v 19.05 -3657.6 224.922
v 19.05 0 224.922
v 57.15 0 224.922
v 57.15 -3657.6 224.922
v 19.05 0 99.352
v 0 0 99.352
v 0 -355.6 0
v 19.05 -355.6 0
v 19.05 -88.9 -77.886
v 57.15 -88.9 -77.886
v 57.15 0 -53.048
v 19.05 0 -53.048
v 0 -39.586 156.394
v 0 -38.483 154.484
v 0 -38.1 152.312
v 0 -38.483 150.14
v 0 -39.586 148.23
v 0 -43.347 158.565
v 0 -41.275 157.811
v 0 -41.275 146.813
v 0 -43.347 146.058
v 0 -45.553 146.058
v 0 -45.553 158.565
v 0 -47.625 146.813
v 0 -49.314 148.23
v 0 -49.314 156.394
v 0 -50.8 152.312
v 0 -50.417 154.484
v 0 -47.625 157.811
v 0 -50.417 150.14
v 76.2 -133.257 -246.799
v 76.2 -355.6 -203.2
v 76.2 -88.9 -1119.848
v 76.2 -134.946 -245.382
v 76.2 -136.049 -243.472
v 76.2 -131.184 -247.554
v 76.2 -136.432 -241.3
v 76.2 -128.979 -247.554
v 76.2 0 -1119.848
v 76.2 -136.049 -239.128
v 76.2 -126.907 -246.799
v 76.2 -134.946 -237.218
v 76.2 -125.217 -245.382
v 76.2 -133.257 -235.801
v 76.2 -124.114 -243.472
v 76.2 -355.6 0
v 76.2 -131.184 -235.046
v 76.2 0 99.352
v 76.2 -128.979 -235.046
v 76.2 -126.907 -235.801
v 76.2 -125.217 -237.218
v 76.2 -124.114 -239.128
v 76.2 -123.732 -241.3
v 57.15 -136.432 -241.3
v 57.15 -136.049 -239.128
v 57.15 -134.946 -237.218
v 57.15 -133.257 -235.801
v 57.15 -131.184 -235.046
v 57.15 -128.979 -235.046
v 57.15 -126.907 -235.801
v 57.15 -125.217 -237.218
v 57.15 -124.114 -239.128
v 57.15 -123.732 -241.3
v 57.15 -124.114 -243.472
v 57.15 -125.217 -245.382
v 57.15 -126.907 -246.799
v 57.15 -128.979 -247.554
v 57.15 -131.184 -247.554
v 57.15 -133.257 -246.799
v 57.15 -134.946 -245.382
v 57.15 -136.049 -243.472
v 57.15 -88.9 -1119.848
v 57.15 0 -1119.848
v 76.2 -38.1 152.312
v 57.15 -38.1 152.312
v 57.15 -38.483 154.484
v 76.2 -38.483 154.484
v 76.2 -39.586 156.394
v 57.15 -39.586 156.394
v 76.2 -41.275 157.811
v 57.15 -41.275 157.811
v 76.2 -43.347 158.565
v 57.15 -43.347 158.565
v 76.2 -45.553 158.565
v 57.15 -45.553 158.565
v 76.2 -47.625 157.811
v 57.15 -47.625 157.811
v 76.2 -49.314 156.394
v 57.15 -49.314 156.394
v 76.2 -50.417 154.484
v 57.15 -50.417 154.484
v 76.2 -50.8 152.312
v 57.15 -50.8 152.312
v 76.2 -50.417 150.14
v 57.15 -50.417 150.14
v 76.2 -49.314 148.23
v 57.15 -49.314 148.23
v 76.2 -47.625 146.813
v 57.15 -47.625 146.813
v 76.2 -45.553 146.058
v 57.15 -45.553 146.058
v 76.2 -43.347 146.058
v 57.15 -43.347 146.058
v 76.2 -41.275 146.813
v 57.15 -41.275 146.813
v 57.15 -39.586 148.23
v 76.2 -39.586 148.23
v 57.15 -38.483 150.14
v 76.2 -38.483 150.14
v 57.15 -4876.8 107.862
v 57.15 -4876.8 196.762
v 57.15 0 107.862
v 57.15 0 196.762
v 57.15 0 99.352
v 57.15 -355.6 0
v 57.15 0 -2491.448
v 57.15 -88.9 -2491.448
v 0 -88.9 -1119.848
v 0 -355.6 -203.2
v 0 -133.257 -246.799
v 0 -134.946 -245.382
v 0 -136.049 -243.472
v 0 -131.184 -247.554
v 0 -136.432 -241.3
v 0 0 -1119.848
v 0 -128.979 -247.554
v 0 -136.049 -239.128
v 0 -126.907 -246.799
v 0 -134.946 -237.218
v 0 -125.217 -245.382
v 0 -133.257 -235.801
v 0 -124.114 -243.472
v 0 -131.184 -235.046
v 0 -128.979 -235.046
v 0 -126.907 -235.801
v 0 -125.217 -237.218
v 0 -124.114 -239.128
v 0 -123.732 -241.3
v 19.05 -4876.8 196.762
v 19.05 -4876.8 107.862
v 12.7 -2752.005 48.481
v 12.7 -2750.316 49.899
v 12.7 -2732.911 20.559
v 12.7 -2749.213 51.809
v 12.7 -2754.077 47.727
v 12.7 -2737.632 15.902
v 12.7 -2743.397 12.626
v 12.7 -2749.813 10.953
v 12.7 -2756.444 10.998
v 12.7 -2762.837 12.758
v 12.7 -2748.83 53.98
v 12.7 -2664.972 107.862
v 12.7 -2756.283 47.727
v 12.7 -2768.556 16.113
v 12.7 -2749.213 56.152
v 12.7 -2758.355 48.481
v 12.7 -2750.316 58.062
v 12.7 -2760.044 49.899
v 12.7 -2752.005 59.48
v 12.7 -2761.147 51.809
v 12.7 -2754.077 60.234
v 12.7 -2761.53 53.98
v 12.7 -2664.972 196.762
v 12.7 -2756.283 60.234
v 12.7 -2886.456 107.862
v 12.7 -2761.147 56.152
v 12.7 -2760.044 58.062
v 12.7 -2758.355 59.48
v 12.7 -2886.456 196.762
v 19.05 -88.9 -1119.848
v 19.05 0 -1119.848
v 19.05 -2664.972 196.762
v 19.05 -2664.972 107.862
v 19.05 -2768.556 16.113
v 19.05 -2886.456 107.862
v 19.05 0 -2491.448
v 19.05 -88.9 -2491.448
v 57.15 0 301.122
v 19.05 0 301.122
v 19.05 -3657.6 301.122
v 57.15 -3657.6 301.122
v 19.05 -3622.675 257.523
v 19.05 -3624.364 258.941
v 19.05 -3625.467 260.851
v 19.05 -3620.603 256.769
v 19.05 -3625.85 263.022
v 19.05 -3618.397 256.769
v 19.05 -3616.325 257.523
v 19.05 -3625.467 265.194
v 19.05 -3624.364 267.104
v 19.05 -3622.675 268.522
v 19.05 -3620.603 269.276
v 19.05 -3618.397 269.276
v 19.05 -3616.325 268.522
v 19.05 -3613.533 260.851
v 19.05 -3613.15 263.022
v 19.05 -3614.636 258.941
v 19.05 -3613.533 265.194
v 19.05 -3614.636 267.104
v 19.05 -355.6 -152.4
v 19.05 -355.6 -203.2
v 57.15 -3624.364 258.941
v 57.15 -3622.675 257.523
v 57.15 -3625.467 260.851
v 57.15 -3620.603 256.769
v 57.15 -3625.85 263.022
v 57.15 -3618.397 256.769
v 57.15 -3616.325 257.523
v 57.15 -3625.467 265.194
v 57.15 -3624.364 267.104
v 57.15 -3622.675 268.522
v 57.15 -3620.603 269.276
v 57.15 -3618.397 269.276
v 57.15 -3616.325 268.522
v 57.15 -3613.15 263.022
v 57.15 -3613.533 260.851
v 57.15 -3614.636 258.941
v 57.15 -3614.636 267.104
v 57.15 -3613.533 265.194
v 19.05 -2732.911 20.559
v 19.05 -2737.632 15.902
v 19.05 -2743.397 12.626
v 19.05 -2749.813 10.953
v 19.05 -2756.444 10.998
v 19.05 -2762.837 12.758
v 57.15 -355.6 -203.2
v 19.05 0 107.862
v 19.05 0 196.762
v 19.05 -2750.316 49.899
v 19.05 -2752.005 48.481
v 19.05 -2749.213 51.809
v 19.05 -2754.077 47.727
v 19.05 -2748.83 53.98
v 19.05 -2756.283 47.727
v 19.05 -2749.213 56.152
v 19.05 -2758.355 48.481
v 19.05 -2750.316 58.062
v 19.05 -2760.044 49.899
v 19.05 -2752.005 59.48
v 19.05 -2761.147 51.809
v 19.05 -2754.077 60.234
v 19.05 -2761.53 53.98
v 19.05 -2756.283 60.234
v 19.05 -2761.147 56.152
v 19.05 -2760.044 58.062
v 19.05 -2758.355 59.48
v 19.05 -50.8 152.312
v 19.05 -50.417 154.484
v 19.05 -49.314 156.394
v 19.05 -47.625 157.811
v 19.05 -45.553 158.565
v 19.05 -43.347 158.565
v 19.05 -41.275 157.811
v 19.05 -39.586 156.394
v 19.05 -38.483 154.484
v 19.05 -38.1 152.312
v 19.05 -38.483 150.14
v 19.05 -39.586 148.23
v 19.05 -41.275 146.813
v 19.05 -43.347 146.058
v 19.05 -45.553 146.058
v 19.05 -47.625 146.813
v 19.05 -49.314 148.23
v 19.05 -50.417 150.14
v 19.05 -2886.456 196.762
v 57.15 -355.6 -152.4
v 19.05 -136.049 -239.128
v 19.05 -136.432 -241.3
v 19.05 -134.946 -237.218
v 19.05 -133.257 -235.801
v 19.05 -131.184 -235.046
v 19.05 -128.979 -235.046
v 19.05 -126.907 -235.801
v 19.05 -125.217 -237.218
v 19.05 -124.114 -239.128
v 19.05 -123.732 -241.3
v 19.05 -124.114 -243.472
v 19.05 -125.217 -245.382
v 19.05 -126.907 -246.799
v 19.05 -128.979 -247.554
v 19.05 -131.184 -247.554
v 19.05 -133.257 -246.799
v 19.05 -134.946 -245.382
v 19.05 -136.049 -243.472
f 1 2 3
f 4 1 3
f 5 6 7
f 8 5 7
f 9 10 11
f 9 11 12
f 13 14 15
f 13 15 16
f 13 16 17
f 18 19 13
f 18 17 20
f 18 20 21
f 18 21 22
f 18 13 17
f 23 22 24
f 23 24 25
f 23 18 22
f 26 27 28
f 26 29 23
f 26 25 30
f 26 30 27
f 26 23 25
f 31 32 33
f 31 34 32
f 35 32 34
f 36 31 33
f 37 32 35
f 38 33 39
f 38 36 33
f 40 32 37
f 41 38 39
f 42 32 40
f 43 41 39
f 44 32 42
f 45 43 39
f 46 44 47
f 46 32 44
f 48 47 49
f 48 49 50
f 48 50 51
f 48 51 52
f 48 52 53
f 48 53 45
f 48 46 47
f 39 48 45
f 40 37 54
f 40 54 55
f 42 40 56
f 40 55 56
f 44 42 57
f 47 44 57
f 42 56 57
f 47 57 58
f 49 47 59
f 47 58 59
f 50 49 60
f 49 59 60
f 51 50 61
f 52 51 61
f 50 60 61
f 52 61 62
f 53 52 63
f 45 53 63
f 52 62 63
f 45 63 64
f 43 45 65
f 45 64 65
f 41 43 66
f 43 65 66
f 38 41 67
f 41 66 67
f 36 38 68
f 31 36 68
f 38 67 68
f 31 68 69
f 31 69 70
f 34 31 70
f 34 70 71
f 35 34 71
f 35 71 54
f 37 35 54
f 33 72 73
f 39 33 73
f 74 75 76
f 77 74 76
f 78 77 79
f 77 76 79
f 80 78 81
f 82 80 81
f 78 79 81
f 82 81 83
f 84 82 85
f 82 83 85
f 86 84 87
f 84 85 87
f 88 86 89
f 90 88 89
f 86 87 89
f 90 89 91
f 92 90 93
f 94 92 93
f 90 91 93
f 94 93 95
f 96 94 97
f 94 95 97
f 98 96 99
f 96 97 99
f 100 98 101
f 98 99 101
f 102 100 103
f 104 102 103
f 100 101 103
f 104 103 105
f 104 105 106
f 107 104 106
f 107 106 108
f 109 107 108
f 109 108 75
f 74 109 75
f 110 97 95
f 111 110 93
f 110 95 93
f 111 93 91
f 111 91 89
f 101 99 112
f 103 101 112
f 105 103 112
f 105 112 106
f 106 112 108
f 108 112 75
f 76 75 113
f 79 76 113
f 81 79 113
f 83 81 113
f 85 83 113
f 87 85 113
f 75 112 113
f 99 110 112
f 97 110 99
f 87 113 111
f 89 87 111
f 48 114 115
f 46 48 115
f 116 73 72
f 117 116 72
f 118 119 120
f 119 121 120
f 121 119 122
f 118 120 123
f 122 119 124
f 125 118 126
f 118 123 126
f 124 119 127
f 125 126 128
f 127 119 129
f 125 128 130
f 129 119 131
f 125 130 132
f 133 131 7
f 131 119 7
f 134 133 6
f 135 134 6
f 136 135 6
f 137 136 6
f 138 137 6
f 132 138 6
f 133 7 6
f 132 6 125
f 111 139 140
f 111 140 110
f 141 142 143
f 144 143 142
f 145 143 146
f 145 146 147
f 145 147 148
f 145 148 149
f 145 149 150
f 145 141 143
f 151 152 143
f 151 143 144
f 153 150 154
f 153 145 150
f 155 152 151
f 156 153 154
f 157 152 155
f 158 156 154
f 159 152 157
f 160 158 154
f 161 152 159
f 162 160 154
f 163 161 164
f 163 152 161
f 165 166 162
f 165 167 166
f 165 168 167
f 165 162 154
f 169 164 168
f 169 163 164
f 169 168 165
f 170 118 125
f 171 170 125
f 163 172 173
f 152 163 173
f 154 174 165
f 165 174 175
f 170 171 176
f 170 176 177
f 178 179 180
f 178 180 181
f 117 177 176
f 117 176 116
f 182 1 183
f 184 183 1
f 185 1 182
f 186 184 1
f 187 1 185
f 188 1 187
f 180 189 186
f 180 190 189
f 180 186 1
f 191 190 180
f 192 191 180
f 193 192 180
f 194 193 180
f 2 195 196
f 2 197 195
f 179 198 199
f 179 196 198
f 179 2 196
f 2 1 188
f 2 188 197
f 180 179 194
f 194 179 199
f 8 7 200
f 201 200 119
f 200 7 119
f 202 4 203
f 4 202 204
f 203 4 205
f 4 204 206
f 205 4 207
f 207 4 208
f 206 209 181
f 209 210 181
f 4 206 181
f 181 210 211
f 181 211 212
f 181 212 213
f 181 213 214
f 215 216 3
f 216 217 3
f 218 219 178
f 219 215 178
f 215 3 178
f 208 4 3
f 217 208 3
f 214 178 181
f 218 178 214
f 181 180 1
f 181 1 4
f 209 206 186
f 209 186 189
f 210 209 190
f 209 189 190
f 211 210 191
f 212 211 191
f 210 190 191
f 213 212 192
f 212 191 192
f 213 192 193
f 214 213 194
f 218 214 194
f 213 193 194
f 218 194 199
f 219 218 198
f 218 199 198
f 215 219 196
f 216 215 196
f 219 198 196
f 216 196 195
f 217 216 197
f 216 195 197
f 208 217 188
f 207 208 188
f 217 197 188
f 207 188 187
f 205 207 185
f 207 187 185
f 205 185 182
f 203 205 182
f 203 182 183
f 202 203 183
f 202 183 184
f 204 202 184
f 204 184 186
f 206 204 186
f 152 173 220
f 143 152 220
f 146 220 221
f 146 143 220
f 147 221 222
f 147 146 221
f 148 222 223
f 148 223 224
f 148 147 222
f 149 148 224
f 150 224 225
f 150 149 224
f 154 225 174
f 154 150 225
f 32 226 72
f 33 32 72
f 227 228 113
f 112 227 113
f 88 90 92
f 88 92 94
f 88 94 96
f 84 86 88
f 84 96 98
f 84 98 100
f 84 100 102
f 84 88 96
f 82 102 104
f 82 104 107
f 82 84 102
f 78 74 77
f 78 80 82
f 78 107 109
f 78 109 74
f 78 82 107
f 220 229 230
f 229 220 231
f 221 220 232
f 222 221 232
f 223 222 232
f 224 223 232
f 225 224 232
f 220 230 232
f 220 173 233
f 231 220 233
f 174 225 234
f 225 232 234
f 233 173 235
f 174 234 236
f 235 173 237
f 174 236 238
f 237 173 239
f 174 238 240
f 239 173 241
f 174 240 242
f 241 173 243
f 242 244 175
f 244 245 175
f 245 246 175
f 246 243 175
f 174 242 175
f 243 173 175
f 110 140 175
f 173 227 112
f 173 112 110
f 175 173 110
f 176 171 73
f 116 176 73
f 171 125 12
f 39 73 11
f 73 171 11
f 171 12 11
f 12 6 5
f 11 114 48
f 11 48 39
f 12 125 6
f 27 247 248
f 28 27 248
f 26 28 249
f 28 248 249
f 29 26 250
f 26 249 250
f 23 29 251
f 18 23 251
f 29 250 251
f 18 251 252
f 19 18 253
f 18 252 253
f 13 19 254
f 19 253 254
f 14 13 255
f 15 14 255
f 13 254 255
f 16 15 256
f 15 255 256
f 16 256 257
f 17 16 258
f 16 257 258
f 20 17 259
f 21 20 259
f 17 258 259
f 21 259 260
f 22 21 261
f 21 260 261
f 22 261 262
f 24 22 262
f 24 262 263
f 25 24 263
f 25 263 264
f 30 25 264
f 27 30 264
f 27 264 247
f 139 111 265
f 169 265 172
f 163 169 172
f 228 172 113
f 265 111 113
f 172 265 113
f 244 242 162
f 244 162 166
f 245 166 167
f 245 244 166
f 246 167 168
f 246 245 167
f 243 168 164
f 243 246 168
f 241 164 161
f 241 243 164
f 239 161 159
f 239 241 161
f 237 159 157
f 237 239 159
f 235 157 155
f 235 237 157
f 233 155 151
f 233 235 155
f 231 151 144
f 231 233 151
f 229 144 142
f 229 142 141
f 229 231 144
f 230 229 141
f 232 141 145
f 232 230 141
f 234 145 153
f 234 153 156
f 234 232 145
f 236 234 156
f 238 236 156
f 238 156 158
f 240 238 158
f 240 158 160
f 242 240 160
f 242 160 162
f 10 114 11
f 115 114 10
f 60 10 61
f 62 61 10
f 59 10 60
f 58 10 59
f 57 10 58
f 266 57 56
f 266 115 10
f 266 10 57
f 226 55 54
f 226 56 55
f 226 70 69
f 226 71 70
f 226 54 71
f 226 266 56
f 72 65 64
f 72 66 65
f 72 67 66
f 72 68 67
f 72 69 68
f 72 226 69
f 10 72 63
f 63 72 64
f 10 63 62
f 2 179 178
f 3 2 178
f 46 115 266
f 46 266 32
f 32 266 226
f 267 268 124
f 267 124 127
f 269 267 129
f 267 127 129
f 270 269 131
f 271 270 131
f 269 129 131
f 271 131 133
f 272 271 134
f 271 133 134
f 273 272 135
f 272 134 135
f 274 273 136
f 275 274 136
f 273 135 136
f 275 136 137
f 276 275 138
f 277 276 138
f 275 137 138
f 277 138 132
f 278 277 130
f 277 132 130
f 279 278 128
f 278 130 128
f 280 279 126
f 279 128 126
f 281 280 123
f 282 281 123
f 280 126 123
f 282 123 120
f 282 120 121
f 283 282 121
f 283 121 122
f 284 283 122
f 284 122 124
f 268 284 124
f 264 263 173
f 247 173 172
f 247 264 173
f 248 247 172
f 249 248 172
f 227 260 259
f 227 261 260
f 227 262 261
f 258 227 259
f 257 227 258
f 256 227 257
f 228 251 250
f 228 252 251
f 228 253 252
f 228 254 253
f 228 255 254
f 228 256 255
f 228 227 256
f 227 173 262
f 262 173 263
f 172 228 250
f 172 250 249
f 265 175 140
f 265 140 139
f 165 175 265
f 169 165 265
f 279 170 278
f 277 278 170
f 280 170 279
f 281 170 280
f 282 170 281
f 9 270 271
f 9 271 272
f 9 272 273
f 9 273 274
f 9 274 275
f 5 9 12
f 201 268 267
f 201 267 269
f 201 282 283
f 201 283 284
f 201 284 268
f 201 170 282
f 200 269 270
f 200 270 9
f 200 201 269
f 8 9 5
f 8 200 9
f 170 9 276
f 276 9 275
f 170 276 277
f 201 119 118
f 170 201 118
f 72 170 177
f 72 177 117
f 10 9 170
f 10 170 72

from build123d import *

# Parameters (mm, degrees)
F1_DEPTH  = 76.2
F2_W      = 38.1
F2_H      = 152.4
F4_W      = 38.1
F4_H      = 266.7
F5_DEPTH  = 1219.201
F6_W      = 38.1
F6_H      = 88.9
F7_DEPTH  = 1371.6
F8_R      = 6.35
F9_DEPTH  = 76.201
F10_W     = 38.1
F10_H     = 88.9
F11_DEPTH = 4876.8
F12_R     = 6.35
F13_DEPTH = 19.05
F14_R     = 6.35
F15_DEPTH = 19.05
F16_R     = 6.35
F17_DEPTH = 6.35
F18_R     = 25.4
F19_W     = 38.1
F19_H     = 76.2
F20_DEPTH = 3657.6
F21_R     = 6.35
F22_DEPTH = 57.151


with BuildPart() as f1:
    # F0 (on Right) → F1 (new body)
    with BuildSketch(Plane.YZ):
        Polygon((0, 99.3522093521), (-355.6, 0), (-355.6, -203.2), (-88.9, -1119.8477906479), (0, -1119.8477906479), align=None)
    extrude(amount=F1_DEPTH)

    # F3: sweep along a path in F3_path
    with BuildLine(Plane(origin=(76.2, 0, 99.3522093521), x_dir=(0, 0.9631156168, 0.2690879201), z_dir=(0, -0.2690879201, 0.9631156168))) as f3_path:
        Line((0, 0), (-369.2183926935, 0))
    # F2 (on face) → F3 (sweep, cut)
    with BuildSketch(Plane(origin=(0, 0, 0), x_dir=(-1, 0, 0), z_dir=(0, 1, 0))):
        with Locations((-38.1, 23.1522093521)):
            Rectangle(F2_W, F2_H)
    sweep(path=f3_path.line, mode=Mode.SUBTRACT)

    # F4 (on face) → F5 (cut, through all)
    with BuildSketch(Plane(origin=(0, 0, -1119.8477906479), x_dir=(1, 0, 0), z_dir=(0, 0, -1))):
        with Locations((38.1, 222.25)):
            Rectangle(F4_W, F4_H)
    extrude(amount=-F5_DEPTH, mode=Mode.SUBTRACT)

    # F6 (on face) → F7 (join)
    with BuildSketch(Plane(origin=(0, 0, -1119.8477906479), x_dir=(1, 0, 0), z_dir=(0, 0, -1))):
        with Locations((38.1, 44.45)):
            Rectangle(F6_W, F6_H)
    extrude(amount=F7_DEPTH)

    # F8 (on face) → F9 (cut, through all)
    with BuildSketch(Plane(origin=(0, 0, 0), x_dir=(0, -1, 0), z_dir=(-1, 0, 0))):
        with Locations((130.0815367264, -241.3)):
            Circle(F8_R)
    extrude(amount=-F9_DEPTH, mode=Mode.SUBTRACT)


with BuildPart() as f11:
    # F10 (on Front) → F11 (new body)
    with BuildSketch(Plane.XZ):
        with Locations((38.1, 152.3119284987)):
            Rectangle(F10_W, F10_H)
    extrude(amount=F11_DEPTH)

    # F12 (on face) → F13 (join)
    with BuildSketch(Plane(origin=(19.05, 0, 0), x_dir=(0, -1, 0), z_dir=(-1, 0, 0))):
        with Locations((44.45, 152.3119284987)):
            Circle(F12_R)
    extrude(amount=F13_DEPTH)

    # F14 (on face) → F15 (join)
    with BuildSketch(Plane.YZ.offset(57.15)):
        with Locations((-44.45, 152.3119284987)):
            Circle(F14_R)
    extrude(amount=F15_DEPTH)

    # F16 (on face) → F17 (join)
    with BuildSketch(Plane(origin=(19.05, 0, 0), x_dir=(0, -1, 0), z_dir=(-1, 0, 0))):
        Polygon((2664.9721741909, 196.7619284987), (2664.9721741909, 107.8619284987), (2748.5108044967, 0.5131851916), (2886.456, 107.8619284987), (2886.456, 196.7619284987), align=None)
        with Locations((2755.1799738946, 53.9803917723)):
            Circle(F16_R, mode=Mode.SUBTRACT)
    extrude(amount=F17_DEPTH)

    # F18
    f18_edges = [f11.edges().sort_by_distance(p)[0] for p in [
        (15.875, -2748.510804, 0.513185),
    ]]
    fillet(f18_edges, radius=F18_R)


with BuildPart() as f20:
    # F19 (on Front) → F20 (new body)
    with BuildSketch(Plane.XZ):
        with Locations((38.1, 263.0223479325)):
            Rectangle(F19_W, F19_H)
    extrude(amount=F20_DEPTH)

    # F21 (on face) → F22 (cut, through all)
    with BuildSketch(Plane(origin=(19.05, 0, 0), x_dir=(0, -1, 0), z_dir=(-1, 0, 0))):
        with Locations((3619.5, 263.0223479325)):
            Circle(F21_R)
    extrude(amount=-F22_DEPTH, mode=Mode.SUBTRACT)


solid = Compound([f1.part, f11.part, f20.part])
